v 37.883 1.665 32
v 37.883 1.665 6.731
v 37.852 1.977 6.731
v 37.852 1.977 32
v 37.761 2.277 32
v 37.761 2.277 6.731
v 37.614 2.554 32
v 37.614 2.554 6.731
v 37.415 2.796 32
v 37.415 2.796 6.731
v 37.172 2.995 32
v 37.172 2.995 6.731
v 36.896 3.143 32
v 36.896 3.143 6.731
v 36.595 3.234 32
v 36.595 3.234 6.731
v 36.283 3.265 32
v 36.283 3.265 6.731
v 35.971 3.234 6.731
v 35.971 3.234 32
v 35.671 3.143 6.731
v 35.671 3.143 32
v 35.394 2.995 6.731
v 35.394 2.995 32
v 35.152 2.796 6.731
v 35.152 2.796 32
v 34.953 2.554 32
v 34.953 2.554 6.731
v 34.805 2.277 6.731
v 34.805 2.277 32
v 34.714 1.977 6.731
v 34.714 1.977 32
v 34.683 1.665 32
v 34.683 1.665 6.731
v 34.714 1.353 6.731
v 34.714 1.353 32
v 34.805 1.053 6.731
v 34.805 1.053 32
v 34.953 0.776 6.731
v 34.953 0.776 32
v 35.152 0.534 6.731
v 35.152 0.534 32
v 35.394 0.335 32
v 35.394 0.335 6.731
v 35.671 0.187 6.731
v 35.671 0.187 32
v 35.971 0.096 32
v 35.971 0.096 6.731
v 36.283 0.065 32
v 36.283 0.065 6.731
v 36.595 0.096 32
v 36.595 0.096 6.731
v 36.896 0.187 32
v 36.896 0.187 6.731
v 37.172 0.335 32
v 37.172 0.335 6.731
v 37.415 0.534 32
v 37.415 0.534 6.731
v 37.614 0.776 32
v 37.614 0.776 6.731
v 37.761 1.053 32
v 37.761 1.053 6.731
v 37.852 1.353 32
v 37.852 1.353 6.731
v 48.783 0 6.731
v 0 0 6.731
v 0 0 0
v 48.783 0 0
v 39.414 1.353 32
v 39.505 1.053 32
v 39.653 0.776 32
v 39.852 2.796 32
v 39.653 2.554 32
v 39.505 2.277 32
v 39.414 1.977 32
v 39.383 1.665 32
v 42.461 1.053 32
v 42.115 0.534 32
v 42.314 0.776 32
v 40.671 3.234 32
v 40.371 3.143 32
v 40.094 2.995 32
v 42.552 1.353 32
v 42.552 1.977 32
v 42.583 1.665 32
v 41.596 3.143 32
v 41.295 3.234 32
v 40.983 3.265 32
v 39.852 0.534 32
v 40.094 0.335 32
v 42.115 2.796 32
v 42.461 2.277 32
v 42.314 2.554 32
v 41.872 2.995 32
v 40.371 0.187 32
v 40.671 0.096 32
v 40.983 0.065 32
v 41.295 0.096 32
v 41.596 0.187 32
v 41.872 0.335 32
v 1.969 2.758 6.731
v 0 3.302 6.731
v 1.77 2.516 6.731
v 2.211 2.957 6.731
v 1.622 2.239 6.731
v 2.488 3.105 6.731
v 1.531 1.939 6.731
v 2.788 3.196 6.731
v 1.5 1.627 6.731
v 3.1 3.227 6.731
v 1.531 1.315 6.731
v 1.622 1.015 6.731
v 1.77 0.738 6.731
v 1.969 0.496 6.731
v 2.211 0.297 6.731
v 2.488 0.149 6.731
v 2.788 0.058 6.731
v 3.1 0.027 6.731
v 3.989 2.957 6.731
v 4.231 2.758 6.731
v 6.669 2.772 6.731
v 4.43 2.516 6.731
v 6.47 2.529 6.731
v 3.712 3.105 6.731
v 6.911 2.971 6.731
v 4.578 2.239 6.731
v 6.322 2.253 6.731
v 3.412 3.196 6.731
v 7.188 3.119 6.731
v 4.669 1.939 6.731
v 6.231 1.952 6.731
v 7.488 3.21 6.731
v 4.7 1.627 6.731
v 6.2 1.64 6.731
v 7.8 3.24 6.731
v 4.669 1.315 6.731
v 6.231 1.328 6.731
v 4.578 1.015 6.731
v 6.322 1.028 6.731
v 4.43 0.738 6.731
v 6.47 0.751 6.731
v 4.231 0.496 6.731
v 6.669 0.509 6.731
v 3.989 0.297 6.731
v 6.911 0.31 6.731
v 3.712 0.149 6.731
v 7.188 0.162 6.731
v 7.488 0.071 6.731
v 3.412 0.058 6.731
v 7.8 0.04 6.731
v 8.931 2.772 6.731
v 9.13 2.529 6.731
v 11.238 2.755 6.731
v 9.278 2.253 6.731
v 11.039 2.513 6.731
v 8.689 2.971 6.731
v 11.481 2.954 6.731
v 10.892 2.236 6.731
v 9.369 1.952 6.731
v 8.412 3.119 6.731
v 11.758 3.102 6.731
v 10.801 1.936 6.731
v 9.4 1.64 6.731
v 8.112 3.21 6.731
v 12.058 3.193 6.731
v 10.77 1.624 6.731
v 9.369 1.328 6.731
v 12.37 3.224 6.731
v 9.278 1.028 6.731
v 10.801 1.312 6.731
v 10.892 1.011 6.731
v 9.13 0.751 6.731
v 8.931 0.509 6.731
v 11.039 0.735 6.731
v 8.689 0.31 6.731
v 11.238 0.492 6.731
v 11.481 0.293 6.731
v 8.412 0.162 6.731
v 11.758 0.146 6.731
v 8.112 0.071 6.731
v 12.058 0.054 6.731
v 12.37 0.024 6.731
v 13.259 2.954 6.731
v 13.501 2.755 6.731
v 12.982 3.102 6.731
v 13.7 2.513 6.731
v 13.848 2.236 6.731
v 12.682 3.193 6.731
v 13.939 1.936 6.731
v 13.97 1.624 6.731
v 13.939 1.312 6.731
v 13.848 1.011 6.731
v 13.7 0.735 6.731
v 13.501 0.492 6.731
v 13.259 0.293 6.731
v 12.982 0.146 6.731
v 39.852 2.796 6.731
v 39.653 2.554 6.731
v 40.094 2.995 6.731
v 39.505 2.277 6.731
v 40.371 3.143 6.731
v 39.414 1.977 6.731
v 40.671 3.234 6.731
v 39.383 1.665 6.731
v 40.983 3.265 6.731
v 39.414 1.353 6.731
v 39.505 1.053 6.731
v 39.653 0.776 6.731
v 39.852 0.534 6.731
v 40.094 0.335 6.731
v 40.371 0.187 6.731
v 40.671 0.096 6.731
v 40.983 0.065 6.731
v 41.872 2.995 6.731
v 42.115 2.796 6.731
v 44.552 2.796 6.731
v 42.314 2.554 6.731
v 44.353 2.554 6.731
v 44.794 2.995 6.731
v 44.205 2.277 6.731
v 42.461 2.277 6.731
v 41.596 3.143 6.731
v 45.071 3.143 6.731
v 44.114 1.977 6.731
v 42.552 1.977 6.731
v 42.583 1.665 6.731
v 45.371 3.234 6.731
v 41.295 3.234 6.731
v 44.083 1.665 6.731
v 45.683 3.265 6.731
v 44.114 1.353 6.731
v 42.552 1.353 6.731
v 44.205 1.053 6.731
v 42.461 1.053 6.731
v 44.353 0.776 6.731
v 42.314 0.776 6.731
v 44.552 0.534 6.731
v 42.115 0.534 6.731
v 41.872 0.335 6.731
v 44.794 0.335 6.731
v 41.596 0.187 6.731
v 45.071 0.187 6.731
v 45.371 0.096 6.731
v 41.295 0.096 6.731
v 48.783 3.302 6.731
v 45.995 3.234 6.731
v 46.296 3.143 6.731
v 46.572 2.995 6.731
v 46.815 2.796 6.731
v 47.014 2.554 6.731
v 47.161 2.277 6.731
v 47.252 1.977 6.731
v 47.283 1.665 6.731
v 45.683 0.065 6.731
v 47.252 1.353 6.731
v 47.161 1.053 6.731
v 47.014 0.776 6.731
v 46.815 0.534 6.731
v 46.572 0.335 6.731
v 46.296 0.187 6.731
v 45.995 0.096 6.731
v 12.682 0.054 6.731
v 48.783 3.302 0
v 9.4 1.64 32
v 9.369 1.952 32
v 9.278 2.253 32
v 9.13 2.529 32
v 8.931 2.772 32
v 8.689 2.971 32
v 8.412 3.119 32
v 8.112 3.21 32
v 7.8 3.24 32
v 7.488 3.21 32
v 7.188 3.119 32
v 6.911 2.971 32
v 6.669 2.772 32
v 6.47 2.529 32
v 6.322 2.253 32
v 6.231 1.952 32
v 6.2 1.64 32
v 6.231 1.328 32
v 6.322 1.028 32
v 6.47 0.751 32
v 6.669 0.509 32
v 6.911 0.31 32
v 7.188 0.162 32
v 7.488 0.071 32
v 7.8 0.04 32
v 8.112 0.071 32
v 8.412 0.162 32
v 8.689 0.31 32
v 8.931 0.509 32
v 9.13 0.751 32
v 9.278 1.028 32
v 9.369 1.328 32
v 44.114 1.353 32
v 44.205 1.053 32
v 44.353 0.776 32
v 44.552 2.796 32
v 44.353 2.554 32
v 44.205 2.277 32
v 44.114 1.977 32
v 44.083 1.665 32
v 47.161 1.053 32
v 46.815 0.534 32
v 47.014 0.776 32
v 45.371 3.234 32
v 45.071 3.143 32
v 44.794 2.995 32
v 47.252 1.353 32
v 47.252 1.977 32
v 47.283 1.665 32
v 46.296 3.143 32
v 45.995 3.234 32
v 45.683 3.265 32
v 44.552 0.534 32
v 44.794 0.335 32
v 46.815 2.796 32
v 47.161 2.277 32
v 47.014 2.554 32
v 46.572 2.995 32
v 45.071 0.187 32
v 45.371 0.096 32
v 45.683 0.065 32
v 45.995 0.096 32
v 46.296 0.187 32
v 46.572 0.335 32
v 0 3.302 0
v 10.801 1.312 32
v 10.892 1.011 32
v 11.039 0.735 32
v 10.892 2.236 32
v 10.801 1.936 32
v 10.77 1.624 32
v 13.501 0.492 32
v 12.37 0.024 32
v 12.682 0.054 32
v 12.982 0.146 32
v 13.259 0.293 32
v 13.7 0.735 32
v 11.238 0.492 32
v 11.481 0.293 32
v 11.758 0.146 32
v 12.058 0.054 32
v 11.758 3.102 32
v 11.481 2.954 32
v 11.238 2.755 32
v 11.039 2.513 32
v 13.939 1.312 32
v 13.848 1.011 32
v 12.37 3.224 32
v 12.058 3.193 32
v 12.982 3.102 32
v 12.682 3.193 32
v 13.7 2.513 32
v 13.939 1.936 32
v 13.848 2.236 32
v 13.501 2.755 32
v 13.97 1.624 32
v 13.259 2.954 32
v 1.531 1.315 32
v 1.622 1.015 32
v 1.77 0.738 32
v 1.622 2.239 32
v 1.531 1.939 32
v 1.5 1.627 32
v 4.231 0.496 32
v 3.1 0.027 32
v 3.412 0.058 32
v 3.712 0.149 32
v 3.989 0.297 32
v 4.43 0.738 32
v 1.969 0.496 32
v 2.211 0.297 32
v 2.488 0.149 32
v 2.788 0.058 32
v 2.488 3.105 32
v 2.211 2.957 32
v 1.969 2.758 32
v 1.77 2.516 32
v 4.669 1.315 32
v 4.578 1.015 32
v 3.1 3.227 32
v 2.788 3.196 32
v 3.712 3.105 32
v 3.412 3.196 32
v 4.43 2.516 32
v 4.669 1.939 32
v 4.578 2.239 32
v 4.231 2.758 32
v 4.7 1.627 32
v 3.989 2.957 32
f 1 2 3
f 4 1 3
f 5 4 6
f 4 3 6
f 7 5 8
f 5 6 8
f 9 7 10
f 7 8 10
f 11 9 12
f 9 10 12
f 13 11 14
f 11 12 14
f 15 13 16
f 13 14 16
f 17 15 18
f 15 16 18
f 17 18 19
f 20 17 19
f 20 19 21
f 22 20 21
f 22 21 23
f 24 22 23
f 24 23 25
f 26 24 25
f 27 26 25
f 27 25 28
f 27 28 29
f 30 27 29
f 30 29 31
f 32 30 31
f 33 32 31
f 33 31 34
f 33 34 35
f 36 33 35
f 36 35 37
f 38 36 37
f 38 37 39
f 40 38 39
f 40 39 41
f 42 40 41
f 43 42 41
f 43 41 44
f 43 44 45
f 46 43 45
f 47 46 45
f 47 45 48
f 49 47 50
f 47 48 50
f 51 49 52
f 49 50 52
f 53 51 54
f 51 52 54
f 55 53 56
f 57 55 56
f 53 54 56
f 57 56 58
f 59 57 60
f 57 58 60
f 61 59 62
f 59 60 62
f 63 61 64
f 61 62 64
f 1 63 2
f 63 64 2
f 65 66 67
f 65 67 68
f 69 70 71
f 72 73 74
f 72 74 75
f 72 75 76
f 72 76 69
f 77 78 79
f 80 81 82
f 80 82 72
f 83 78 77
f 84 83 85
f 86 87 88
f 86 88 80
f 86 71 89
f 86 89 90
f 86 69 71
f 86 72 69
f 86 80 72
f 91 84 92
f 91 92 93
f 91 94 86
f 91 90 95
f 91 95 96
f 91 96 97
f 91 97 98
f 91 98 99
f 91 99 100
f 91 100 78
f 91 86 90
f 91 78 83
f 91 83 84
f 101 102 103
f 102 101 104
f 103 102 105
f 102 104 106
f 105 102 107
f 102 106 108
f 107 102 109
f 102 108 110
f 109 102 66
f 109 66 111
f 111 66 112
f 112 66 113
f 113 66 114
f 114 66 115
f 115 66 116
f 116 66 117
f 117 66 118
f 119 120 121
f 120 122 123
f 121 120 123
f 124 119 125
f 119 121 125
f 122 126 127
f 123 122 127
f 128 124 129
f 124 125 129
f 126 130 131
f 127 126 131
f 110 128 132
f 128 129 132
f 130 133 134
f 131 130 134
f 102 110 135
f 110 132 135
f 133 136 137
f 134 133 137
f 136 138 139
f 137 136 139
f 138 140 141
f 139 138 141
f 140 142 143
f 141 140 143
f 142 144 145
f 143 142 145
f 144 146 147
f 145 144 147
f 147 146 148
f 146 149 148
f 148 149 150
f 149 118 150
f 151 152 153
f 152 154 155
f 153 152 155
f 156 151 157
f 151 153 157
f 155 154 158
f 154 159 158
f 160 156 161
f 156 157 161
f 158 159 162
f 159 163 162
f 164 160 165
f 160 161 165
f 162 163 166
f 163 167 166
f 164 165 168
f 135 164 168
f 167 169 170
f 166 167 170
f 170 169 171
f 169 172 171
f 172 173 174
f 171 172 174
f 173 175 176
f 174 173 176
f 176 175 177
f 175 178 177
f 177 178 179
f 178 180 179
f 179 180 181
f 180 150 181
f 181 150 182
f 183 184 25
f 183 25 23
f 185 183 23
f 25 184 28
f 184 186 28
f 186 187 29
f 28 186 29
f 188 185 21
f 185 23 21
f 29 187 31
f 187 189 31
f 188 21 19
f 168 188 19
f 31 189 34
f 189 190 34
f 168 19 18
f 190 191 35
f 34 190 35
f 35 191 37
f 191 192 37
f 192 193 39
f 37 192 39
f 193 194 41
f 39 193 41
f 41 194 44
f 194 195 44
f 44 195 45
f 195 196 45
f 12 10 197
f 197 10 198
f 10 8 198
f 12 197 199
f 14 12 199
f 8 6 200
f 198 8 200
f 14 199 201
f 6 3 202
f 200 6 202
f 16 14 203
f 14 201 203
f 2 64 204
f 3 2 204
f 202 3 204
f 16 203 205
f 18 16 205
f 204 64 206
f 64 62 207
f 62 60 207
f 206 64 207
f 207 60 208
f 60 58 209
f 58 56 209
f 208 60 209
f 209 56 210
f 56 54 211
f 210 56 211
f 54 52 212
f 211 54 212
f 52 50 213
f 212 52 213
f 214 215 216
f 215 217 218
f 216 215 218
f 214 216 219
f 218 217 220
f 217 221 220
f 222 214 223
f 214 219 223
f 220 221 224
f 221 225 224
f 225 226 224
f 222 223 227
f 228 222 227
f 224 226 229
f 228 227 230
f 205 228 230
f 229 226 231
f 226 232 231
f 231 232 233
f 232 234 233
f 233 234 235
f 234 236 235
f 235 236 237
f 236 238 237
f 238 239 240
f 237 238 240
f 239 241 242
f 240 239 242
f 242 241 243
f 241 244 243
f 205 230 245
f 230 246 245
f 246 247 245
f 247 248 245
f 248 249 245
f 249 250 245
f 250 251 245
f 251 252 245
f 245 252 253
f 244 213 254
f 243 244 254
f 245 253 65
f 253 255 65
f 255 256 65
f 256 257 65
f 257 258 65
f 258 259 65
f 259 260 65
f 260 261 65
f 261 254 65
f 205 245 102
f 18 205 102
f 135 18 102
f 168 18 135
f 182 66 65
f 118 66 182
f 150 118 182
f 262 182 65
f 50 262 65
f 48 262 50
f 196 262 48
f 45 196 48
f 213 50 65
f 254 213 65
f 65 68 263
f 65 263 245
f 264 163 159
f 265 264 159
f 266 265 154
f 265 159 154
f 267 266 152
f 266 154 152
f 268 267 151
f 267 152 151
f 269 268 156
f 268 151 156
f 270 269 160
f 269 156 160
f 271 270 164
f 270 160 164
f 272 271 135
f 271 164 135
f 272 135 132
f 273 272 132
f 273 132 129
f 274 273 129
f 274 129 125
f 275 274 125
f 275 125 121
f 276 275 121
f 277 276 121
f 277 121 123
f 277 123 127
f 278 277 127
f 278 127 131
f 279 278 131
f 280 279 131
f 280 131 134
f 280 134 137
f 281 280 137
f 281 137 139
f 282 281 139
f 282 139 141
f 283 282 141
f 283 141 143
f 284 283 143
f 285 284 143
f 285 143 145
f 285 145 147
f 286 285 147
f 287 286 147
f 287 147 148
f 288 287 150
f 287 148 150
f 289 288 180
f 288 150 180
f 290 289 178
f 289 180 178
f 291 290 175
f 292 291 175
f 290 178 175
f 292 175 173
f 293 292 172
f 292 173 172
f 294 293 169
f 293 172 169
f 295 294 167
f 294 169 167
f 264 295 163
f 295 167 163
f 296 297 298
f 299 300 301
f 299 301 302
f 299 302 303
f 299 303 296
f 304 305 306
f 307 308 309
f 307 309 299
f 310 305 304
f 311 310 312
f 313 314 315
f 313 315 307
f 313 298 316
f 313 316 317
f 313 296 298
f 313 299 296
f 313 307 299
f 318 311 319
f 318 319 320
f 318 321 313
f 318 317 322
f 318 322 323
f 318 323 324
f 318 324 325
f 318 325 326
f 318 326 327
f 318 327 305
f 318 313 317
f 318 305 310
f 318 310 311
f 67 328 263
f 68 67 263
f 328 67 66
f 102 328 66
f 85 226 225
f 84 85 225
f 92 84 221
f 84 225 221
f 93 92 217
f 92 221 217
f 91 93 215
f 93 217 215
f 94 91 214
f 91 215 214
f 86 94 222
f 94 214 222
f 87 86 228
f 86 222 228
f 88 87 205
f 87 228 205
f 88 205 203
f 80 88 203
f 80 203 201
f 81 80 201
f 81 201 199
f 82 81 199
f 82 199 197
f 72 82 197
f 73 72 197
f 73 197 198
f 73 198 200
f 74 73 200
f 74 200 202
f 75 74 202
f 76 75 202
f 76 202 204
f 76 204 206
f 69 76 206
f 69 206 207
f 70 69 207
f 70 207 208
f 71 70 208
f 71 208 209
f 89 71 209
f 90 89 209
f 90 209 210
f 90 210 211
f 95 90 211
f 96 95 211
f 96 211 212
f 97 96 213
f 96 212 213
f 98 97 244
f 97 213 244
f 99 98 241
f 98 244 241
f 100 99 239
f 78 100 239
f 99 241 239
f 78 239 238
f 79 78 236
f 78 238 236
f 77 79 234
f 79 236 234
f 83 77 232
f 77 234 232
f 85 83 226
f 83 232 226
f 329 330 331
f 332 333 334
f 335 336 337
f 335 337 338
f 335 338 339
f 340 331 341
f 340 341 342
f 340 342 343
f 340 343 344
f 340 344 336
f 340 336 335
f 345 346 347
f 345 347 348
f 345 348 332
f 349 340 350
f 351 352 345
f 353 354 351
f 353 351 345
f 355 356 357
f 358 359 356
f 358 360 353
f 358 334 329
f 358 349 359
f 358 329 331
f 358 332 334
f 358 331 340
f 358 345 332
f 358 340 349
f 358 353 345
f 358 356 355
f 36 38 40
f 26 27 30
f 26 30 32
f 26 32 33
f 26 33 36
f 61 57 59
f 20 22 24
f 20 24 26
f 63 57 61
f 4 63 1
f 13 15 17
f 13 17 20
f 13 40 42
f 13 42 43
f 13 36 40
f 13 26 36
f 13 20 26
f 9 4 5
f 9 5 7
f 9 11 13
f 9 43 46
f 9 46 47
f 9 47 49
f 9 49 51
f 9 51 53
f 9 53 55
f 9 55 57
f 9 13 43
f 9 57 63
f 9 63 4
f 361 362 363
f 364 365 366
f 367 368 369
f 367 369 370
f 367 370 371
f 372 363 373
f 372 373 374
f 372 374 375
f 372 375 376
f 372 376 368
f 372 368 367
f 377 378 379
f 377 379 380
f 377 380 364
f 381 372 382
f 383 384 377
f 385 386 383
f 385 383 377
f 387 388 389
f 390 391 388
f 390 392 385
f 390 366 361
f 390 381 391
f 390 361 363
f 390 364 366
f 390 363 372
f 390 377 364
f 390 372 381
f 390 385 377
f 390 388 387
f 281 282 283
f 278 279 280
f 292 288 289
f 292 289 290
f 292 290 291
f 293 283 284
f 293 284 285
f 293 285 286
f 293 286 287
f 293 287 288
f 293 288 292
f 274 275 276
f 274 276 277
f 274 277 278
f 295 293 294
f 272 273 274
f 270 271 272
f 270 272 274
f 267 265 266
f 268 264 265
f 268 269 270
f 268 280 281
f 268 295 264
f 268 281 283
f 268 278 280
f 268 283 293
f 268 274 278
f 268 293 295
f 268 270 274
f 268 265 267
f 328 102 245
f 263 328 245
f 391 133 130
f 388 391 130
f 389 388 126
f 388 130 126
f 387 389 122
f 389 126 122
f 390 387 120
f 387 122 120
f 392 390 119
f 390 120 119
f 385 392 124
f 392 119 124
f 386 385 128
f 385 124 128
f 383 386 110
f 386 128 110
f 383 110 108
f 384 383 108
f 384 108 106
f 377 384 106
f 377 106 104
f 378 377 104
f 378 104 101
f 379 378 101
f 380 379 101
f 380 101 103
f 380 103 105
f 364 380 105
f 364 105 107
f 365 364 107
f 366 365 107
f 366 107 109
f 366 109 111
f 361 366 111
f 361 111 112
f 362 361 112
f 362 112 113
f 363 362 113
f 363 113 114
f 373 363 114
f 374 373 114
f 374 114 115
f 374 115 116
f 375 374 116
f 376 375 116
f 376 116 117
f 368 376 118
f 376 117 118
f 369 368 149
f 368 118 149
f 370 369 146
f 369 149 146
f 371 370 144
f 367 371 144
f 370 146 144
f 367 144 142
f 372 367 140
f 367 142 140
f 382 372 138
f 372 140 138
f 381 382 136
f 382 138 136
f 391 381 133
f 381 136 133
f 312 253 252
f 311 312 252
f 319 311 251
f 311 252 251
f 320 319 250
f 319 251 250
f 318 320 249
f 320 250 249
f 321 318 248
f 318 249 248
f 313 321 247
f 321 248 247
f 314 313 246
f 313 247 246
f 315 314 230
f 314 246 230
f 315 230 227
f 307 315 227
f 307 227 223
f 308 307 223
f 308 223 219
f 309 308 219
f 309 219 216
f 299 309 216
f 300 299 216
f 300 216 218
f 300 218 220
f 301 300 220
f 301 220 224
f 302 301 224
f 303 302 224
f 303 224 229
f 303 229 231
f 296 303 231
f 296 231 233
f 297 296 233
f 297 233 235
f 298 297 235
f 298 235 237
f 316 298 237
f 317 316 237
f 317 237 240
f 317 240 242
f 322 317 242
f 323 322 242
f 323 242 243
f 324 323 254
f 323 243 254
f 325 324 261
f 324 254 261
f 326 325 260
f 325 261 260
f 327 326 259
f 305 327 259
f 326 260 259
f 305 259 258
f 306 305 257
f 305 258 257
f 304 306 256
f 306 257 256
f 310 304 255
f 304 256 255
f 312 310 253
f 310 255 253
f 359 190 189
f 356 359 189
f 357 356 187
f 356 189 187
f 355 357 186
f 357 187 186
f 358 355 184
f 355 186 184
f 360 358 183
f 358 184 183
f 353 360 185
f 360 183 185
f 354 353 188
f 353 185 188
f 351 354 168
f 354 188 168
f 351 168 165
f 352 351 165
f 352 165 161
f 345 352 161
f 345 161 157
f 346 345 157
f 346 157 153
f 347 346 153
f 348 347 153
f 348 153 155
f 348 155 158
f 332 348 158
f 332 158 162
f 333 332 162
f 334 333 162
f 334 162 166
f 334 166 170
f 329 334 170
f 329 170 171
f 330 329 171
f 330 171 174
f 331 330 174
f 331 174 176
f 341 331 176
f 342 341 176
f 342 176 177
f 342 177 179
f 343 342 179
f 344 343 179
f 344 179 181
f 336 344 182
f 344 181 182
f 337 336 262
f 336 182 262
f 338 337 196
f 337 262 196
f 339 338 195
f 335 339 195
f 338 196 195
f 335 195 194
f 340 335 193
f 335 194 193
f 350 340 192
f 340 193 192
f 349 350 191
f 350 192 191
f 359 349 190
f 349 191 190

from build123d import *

# Parameters (mm, degrees)
F0_W     = 48.783202
F0_H     = 6.73111
F1_DEPTH = 3.302
F2_R     = 1.6
F3_DEPTH = 32


with BuildPart() as f1:
    # F0 (on Front) → F1 (new body)
    with BuildSketch(Plane.XZ):
        with Locations((24.391601, 3.365555)):
            Rectangle(F0_W, F0_H)
    extrude(amount=-F1_DEPTH)

    # F2 (on Top) → F3 (join)
    with BuildSketch(Plane.XY):
        with Locations((3.1, 1.626936)):
            Circle(F2_R)
        with Locations((7.799981, 1.640332)):
            Circle(F2_R)
        with Locations((12.369818, 1.623737)):
            Circle(F2_R)
        with Locations((36.283233, 1.66498)):
            Circle(F2_R)
        with Locations((40.983233, 1.66498)):
            Circle(F2_R)
        with Locations((45.683233, 1.66498)):
            Circle(F2_R)
    extrude(amount=F3_DEPTH)


solid = f1.part
